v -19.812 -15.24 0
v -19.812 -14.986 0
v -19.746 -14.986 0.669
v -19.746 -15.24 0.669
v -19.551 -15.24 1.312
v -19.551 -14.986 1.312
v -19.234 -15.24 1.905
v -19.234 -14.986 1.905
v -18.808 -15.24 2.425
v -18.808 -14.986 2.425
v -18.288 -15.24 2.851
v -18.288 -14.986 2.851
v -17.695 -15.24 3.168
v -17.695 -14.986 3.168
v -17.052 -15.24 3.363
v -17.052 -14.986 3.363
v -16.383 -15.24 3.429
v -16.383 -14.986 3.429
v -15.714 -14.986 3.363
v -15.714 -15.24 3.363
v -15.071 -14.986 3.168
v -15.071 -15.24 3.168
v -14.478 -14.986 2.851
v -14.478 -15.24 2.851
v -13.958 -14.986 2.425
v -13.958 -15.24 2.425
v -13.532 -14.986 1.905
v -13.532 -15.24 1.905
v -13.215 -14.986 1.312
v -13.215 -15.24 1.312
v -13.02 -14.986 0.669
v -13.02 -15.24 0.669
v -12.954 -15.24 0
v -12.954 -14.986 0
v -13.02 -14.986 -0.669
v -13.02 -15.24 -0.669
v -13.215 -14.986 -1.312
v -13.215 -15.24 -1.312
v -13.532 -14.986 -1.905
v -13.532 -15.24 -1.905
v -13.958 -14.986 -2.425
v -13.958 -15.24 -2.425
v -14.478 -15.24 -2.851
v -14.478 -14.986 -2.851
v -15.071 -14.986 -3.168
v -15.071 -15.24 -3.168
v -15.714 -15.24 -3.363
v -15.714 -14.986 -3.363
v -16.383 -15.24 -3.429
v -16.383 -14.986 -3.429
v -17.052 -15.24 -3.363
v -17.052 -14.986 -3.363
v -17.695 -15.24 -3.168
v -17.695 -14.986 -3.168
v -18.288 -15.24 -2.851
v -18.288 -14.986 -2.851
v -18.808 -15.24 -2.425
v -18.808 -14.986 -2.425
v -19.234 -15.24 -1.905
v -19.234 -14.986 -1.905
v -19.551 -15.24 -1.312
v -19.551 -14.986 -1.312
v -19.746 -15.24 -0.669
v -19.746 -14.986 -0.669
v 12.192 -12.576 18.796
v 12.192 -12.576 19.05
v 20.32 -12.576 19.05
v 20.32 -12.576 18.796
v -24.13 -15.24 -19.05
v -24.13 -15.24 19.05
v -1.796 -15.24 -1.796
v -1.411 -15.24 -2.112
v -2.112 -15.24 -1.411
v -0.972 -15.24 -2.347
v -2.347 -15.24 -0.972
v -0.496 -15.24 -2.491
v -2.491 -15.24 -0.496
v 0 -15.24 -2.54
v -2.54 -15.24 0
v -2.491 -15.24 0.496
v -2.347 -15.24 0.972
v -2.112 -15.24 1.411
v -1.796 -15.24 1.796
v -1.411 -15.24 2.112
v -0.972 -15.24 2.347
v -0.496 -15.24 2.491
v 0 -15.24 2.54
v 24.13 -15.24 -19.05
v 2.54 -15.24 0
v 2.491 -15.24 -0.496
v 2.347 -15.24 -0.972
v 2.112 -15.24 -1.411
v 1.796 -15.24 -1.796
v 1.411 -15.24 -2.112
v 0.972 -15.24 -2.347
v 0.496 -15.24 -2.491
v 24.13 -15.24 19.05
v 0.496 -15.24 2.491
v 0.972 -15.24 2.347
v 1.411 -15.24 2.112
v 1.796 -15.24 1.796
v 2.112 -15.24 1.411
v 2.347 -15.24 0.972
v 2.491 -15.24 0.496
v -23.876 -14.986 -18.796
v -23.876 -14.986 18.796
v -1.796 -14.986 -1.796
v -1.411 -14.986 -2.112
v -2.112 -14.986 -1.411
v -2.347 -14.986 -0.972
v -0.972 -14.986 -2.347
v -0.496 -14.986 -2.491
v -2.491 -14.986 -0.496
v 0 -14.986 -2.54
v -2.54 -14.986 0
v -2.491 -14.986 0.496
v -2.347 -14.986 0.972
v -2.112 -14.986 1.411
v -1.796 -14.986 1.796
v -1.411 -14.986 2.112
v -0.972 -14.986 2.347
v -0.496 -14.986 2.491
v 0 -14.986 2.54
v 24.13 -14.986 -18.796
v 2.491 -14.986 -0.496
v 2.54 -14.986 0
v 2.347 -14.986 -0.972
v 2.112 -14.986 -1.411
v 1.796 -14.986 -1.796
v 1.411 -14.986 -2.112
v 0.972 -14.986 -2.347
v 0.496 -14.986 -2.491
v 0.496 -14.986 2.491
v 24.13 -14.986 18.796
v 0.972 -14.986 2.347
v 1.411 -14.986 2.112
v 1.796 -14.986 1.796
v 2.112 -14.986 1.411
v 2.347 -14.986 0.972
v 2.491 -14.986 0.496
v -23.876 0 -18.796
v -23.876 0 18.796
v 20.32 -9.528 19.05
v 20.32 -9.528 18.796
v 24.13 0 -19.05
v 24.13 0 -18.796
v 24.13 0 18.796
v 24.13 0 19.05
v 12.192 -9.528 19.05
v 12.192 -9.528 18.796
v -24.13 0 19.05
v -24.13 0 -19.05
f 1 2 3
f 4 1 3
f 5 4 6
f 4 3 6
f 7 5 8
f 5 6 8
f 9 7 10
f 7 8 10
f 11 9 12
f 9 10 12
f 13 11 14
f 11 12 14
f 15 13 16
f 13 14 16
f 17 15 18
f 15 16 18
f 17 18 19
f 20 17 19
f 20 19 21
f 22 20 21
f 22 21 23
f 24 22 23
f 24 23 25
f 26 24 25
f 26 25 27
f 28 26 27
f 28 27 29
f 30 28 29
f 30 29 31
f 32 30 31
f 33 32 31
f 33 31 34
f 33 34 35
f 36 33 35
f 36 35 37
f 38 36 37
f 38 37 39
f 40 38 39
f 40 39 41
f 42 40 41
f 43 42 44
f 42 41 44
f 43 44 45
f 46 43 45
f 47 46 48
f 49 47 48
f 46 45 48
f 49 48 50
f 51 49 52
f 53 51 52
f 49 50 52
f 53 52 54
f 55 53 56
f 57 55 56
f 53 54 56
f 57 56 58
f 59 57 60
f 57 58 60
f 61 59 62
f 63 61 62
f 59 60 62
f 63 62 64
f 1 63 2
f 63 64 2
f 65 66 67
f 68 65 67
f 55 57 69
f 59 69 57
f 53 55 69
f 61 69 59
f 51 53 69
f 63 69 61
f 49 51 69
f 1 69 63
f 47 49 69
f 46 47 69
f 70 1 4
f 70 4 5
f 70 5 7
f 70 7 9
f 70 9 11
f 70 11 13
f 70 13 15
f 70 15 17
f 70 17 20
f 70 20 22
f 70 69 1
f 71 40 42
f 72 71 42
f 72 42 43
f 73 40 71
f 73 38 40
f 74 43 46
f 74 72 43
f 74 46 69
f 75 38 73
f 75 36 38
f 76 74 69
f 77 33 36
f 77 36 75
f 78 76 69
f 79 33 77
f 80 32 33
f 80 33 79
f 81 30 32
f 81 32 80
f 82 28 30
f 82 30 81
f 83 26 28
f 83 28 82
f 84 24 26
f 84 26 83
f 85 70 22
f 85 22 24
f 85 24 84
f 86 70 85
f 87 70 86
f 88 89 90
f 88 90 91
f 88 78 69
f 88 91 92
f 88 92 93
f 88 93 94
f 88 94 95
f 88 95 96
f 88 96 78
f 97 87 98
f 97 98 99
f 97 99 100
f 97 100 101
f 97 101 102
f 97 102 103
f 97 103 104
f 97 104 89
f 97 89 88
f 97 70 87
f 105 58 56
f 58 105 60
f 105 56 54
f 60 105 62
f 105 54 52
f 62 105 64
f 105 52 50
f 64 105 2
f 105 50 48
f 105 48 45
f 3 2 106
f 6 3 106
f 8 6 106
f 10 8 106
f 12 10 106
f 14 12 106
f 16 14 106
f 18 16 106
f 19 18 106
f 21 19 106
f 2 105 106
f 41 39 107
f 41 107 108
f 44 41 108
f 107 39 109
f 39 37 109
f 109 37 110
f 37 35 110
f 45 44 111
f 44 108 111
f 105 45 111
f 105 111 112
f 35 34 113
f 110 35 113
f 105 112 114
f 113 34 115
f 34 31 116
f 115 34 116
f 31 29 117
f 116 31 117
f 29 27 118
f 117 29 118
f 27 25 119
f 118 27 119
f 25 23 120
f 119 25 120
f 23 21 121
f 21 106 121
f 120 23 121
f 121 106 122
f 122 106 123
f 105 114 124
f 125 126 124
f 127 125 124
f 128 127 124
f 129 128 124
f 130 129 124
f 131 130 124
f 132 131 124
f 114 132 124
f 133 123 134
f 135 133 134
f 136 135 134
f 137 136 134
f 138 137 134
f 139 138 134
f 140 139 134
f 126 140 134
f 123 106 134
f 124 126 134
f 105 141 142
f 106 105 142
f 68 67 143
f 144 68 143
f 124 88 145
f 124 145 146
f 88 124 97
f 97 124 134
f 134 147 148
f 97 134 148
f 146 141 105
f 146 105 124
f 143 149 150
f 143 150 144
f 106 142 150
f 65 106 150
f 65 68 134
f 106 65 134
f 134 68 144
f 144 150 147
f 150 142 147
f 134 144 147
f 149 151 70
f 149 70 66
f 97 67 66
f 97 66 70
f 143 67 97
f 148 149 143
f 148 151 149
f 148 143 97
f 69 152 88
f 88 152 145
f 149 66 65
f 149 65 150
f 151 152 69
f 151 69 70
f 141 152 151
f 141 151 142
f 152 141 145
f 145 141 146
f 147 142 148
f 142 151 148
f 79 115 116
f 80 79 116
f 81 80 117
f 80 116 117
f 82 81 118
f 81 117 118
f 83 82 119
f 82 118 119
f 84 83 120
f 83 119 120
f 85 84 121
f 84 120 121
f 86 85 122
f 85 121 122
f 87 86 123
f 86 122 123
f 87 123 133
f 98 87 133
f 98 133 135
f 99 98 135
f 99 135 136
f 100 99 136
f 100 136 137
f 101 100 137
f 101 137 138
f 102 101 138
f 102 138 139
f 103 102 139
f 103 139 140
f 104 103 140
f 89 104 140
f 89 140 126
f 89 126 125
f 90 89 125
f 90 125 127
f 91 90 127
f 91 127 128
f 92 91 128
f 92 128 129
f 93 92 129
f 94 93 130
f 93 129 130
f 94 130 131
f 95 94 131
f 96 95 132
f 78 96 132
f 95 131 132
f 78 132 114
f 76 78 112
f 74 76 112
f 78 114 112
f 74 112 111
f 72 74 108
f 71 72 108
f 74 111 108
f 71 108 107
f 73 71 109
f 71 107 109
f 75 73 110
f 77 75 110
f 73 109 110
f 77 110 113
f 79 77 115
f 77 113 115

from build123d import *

# Parameters (mm, degrees)
F0_W     = 48.26
F0_H     = 38.1
F1_DEPTH = 15.24
F3_T     = -0.254
F4_D     = 6.858
F6_D     = 5.08
F7_W     = 8.128
F7_H     = 3.048
F8_DEPTH = 25.4


with BuildPart() as f1:
    # F0 (on Front) → F1 (new body)
    with BuildSketch(Plane.XZ):
        Rectangle(F0_W, F0_H)
    extrude(amount=F1_DEPTH)

    # F3
    f3_openings = [f1.faces().sort_by_distance(p)[0] for p in [
        (0, 0, 0),
        (24.13, -7.62, 0),
    ]]
    offset(amount=F3_T, openings=f3_openings)

    # F4 (through all)
    with Locations(Plane.XZ.offset(15.24)):
        with Locations((-16.383, 0)):
            Hole(F4_D / 2)

    # F6 (through all)
    with Locations(Plane.XZ.offset(15.24)):
        with Locations((0, 0)):
            Hole(F6_D / 2)

    # F7 (on face) → F8 (cut)
    with BuildSketch(Plane.XY.offset(19.05)):
        with Locations((16.256, -11.051697)):
            Rectangle(F7_W, F7_H)
    extrude(amount=-F8_DEPTH, mode=Mode.SUBTRACT)


solid = f1.part
